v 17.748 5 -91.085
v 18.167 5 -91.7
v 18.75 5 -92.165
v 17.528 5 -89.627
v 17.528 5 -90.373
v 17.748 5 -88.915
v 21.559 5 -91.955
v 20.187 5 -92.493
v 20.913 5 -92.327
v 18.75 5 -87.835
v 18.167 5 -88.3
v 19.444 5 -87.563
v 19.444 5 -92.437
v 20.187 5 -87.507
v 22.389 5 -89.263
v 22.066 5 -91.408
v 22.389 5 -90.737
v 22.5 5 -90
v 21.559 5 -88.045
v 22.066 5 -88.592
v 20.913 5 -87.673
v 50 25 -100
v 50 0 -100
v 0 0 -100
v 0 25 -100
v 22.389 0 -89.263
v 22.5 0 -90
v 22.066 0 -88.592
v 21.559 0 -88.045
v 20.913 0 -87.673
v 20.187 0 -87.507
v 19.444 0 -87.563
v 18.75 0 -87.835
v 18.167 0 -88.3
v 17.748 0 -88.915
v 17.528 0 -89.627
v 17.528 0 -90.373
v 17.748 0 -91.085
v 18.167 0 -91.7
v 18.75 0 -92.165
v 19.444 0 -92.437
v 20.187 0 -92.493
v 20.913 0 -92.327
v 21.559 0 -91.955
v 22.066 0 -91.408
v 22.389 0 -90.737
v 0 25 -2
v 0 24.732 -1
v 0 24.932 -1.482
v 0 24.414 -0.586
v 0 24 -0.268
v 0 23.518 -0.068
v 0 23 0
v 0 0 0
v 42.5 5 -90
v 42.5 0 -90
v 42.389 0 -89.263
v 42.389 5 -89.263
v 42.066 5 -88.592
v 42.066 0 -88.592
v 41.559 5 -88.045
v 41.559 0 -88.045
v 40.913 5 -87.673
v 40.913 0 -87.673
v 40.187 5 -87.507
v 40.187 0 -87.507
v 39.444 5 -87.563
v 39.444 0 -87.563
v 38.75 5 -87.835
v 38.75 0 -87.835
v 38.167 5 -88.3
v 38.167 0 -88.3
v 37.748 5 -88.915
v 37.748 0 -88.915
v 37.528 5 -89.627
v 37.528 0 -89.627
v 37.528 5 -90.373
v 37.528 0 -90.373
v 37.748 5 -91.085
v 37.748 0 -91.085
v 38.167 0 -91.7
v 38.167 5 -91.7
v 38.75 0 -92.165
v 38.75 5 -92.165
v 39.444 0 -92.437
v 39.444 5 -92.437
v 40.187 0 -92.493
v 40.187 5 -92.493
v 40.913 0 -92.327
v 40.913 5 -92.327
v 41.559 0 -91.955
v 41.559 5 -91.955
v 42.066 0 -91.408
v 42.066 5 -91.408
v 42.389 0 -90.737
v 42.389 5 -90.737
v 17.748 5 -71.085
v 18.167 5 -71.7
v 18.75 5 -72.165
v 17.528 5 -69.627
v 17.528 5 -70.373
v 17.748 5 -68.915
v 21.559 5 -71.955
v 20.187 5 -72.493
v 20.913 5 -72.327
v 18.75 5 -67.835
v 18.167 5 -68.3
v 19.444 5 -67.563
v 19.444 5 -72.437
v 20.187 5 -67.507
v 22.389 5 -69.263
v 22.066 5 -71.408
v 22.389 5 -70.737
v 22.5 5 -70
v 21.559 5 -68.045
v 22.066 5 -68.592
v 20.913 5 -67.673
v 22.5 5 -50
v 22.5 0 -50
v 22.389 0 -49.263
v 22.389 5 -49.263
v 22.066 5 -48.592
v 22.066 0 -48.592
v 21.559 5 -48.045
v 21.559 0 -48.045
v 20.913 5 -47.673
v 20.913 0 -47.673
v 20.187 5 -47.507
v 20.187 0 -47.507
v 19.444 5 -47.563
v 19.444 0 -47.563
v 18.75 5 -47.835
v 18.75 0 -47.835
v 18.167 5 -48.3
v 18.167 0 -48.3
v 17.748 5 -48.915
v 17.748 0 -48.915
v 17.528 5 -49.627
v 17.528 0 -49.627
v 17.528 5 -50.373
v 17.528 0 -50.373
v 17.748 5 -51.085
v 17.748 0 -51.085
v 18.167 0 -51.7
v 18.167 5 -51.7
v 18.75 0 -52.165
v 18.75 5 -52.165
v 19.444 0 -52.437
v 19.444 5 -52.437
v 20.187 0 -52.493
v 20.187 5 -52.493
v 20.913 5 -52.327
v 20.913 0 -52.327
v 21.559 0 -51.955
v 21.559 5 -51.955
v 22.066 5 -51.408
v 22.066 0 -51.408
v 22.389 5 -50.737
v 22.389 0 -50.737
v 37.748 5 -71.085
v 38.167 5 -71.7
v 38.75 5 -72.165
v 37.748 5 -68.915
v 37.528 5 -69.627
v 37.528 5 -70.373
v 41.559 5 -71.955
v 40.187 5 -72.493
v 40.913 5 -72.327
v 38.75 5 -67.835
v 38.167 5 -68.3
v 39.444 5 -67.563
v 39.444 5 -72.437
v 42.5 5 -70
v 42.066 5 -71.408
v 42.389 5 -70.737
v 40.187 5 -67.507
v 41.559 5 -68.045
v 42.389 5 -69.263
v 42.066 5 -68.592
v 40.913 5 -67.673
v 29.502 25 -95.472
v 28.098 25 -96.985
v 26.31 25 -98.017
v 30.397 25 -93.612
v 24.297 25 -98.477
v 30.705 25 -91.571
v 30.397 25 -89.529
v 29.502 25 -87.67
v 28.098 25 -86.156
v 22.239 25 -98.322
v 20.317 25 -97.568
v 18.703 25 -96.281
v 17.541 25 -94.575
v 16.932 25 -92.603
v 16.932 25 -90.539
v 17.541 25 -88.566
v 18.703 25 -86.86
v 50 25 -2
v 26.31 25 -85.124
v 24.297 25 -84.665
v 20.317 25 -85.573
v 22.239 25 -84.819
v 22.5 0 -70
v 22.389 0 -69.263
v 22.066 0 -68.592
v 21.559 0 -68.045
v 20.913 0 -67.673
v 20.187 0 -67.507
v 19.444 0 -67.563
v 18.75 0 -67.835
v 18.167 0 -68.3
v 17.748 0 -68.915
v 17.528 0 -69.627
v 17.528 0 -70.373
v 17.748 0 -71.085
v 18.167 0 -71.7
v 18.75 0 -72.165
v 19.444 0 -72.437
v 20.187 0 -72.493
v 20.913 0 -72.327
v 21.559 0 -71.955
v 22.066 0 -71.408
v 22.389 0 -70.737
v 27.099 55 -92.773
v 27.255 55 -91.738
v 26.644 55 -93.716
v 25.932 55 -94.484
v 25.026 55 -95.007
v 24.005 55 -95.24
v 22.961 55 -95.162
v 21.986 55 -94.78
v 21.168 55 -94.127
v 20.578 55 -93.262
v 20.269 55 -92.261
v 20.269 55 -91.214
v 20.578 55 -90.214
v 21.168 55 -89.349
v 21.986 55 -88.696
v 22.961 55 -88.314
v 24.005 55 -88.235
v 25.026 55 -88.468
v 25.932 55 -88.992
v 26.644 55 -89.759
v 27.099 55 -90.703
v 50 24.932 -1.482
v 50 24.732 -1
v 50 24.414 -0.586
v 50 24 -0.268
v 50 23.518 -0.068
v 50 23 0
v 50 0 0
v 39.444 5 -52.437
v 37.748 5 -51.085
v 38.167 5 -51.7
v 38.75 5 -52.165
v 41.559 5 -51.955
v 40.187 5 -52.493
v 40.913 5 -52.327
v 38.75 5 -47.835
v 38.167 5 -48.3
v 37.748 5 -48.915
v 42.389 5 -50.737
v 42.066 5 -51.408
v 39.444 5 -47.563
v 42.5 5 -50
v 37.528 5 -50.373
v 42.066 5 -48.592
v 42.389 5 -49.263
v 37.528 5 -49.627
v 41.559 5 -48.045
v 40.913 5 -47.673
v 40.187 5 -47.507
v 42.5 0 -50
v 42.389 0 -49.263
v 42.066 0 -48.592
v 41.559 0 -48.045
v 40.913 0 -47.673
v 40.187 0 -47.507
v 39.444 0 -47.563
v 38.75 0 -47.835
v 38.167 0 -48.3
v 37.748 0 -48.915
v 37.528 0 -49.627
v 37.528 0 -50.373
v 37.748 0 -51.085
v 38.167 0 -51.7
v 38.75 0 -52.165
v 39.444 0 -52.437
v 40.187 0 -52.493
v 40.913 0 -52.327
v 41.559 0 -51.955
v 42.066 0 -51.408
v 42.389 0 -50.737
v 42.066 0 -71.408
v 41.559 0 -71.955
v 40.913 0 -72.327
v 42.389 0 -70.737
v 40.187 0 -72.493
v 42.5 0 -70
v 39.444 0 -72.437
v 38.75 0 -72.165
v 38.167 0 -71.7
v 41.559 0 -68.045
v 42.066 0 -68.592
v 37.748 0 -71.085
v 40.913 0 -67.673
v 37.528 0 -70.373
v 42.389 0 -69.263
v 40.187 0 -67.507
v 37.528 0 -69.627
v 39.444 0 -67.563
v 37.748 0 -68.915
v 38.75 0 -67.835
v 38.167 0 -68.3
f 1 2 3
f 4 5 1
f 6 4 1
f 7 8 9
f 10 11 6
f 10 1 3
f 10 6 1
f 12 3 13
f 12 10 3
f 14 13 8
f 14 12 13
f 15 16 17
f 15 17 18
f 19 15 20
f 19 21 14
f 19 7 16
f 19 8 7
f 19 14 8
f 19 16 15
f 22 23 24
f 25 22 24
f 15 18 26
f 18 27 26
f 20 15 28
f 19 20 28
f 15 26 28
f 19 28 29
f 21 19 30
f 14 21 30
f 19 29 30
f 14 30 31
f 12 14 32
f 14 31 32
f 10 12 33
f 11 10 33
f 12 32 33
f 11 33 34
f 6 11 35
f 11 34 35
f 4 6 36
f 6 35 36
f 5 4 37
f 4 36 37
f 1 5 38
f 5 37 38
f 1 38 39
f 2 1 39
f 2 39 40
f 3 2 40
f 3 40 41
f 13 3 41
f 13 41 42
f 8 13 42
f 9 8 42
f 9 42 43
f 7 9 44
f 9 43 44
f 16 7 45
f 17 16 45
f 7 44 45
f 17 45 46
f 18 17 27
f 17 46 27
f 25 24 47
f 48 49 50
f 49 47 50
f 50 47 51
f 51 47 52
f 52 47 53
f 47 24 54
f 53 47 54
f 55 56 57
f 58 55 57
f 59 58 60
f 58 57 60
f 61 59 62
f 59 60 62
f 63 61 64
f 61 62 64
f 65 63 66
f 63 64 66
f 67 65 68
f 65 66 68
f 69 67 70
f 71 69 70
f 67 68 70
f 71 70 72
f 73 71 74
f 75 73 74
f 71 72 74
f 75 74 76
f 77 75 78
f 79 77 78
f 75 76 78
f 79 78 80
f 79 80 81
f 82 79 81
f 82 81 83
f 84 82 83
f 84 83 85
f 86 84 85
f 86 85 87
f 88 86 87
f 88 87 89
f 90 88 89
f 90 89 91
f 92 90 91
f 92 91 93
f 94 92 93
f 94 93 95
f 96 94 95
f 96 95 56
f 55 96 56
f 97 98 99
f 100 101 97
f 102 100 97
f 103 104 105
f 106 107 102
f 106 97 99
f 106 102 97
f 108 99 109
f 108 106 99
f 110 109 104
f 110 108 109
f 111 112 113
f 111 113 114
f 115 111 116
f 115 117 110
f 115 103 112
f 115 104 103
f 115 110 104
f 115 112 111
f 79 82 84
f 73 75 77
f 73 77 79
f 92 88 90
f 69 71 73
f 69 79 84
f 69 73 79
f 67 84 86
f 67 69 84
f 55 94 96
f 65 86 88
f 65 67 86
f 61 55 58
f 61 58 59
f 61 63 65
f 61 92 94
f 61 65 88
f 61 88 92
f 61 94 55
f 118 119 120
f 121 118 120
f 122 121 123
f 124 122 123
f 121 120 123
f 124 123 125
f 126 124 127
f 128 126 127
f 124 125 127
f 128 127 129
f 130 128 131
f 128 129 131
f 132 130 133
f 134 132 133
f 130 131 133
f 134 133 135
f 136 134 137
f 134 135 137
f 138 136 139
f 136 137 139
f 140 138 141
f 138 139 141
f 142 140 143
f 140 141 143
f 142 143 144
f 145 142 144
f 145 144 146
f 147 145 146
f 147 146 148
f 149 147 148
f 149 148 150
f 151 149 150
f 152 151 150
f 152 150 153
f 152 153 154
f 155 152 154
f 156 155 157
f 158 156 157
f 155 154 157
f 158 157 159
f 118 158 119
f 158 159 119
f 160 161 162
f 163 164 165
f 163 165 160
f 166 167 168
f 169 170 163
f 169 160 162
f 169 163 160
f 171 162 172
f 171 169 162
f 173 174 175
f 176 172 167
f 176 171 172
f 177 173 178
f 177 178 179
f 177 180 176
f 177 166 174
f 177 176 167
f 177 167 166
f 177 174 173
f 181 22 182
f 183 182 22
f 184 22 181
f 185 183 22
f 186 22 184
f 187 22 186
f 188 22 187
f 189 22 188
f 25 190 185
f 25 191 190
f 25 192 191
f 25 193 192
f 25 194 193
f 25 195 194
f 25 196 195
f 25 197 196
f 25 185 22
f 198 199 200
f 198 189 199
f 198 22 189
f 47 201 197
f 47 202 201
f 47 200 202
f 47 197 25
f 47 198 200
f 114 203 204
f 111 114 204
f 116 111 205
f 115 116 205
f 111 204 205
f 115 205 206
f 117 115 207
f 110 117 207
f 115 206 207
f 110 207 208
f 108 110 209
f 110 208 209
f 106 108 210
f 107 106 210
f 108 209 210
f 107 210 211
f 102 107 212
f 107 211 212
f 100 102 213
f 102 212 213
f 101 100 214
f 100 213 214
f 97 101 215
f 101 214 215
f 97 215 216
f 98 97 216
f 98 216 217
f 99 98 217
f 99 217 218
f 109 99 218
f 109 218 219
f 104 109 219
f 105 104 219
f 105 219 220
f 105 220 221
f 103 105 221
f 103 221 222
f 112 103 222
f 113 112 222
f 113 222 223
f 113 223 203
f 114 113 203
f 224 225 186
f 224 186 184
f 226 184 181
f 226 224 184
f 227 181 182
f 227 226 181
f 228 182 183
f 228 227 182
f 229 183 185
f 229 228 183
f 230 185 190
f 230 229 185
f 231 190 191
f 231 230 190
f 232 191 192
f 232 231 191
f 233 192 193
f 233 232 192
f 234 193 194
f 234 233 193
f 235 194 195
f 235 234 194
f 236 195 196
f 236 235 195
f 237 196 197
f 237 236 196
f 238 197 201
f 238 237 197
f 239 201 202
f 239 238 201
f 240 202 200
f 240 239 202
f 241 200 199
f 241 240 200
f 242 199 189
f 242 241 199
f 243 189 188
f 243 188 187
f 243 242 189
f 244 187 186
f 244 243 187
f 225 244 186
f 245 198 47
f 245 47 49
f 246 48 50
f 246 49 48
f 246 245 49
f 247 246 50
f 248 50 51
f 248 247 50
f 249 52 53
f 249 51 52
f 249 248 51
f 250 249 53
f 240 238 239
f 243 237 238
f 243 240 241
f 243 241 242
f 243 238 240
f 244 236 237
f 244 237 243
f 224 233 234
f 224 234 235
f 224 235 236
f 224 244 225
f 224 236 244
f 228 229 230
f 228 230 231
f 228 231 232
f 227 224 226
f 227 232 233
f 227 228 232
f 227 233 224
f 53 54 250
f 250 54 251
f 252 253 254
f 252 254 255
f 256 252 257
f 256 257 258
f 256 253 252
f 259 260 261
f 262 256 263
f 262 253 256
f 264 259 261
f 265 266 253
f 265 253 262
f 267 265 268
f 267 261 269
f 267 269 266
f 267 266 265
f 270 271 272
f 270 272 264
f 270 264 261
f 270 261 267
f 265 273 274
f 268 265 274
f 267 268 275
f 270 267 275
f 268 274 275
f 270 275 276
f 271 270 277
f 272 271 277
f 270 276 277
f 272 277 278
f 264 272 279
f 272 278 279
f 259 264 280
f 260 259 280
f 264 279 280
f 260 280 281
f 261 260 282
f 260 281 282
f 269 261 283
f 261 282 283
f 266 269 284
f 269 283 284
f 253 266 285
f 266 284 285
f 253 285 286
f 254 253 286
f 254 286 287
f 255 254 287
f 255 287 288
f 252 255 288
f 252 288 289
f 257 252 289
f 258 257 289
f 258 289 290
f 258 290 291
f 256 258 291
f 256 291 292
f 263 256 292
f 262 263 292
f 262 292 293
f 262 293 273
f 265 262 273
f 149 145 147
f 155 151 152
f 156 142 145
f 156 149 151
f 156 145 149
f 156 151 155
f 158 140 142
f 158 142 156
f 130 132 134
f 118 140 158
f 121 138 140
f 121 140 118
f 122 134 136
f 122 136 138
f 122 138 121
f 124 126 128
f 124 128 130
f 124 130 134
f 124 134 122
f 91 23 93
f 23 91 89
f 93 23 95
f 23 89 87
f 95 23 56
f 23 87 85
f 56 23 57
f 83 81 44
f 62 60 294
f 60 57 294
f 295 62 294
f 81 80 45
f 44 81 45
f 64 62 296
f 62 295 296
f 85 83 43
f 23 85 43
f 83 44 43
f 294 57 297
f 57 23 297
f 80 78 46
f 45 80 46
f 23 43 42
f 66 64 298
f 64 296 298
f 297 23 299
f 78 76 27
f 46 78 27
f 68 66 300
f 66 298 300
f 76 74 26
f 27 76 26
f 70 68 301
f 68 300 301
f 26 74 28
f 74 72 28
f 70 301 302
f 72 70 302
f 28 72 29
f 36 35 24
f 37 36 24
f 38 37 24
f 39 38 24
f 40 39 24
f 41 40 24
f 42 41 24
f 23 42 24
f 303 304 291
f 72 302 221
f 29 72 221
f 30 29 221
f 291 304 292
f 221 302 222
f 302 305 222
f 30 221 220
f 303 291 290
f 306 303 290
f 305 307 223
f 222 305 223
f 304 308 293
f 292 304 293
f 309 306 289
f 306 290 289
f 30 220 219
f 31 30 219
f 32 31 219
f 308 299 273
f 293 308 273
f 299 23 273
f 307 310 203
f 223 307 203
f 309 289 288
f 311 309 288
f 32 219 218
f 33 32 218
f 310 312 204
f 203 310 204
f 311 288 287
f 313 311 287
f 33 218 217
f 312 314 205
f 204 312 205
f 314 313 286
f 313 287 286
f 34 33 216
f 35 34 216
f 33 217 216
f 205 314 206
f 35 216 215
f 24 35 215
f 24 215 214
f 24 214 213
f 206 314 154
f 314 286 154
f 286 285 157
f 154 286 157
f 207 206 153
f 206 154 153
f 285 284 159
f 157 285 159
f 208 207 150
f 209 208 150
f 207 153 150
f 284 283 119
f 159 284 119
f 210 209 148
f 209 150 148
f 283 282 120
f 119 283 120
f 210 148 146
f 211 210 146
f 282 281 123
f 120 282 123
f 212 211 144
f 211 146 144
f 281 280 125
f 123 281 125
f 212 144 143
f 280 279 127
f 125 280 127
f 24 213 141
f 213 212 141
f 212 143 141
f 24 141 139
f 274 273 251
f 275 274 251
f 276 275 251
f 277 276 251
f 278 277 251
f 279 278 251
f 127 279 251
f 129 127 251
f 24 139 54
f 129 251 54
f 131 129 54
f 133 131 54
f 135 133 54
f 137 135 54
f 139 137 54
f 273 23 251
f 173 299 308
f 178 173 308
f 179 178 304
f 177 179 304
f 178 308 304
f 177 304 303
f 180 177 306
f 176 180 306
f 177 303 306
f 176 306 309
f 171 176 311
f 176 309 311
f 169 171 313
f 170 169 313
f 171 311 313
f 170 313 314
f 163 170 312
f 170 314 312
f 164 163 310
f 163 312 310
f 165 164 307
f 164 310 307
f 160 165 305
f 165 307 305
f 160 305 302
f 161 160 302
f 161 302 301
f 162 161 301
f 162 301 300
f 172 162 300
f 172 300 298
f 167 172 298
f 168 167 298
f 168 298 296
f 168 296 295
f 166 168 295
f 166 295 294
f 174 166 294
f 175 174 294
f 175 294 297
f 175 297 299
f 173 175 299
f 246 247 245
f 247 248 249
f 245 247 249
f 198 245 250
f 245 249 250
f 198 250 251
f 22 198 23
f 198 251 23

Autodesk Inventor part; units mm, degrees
ref_plane "YZ Plane" through (0, 0, 0) normal (1, 0, 0) x (0, 1, 0)
ref_plane "XZ Plane" through (0, 0, 0) normal (0, 1, 0) x (-1, 0, 0)
sketch "Sketch1" plane through (0, 0, 0) normal (0, 1, 0) x (-1, 0, 0)
  line L0 (0, 0) -> (-50, 0)
  line L1 (-50, 0) -> (-50, -100)
  line L2 (-50, -100) -> (0, -100)
  line L3 (0, -100) -> (0, 0)
  dimension "d3" = 100
  dimension "d4" = 50
extrude "Extrusion1" add sketch "Sketch1" along normal blind 25
fillet "Fillet1" radius 2 1 edges at (25, 25, 0)
ref_plane "Work Plane1" through (0, 55, 0) normal (0, 1, 0) x (1, 0, 0)
sketch "Sketch2" plane through (0, 55, 0) normal (0, 1, 0) x (1, 0, 0)
  point P0 (0, 0)
sketch "Sketch3" plane through (0, 25, 0) normal (0, 1, 0) x (1, 0, 0)
  circle A0 centre (23.7799, 91.5707) radius 6.9252
  point P0 (0, 0)
sketch "Sketch4" plane through (0, 55, 0) normal (0, 1, 0) x (1, 0, 0)
  circle A0 centre (23.7424, 91.7378) radius 3.5123
  point P0 (0, 0)
loft "Loft1" add profiles "Sketch3", "Sketch4"
sketch "Sketch5" plane through (0, 0, 0) normal (0, -1, 0) x (1, 0, 0)
  line L0 (50, -100) -> (0, -100) projected
  line L1 (50, -100) -> (50, -90)
  line L2 (50, -2) -> (50, -100) projected
  line L3 (50, -90) -> (40, -90)
  circle A0 centre (40, -90) radius 2.5
  line L4 (40, -90) -> (40, -73.1599)
  line L5 (40, -90) -> (17.7006, -90)
  circle A1 centre (40, -70) radius 2.5
  circle A2 centre (40, -50) radius 2.5
  circle A3 centre (20, -90) radius 2.5
  circle A4 centre (20, -70) radius 2.5
  circle A5 centre (20, -50) radius 2.5
  point P0 (0, 0)
  dimension "d10" = 10
  dimension "d11" = 10
  dimension "d12" = 5
  dimension "d15" = 20
  dimension "d18" = 20
extrude "Extrusion2" cut sketch "Sketch5" against normal blind 5
properties part number "kappale"
